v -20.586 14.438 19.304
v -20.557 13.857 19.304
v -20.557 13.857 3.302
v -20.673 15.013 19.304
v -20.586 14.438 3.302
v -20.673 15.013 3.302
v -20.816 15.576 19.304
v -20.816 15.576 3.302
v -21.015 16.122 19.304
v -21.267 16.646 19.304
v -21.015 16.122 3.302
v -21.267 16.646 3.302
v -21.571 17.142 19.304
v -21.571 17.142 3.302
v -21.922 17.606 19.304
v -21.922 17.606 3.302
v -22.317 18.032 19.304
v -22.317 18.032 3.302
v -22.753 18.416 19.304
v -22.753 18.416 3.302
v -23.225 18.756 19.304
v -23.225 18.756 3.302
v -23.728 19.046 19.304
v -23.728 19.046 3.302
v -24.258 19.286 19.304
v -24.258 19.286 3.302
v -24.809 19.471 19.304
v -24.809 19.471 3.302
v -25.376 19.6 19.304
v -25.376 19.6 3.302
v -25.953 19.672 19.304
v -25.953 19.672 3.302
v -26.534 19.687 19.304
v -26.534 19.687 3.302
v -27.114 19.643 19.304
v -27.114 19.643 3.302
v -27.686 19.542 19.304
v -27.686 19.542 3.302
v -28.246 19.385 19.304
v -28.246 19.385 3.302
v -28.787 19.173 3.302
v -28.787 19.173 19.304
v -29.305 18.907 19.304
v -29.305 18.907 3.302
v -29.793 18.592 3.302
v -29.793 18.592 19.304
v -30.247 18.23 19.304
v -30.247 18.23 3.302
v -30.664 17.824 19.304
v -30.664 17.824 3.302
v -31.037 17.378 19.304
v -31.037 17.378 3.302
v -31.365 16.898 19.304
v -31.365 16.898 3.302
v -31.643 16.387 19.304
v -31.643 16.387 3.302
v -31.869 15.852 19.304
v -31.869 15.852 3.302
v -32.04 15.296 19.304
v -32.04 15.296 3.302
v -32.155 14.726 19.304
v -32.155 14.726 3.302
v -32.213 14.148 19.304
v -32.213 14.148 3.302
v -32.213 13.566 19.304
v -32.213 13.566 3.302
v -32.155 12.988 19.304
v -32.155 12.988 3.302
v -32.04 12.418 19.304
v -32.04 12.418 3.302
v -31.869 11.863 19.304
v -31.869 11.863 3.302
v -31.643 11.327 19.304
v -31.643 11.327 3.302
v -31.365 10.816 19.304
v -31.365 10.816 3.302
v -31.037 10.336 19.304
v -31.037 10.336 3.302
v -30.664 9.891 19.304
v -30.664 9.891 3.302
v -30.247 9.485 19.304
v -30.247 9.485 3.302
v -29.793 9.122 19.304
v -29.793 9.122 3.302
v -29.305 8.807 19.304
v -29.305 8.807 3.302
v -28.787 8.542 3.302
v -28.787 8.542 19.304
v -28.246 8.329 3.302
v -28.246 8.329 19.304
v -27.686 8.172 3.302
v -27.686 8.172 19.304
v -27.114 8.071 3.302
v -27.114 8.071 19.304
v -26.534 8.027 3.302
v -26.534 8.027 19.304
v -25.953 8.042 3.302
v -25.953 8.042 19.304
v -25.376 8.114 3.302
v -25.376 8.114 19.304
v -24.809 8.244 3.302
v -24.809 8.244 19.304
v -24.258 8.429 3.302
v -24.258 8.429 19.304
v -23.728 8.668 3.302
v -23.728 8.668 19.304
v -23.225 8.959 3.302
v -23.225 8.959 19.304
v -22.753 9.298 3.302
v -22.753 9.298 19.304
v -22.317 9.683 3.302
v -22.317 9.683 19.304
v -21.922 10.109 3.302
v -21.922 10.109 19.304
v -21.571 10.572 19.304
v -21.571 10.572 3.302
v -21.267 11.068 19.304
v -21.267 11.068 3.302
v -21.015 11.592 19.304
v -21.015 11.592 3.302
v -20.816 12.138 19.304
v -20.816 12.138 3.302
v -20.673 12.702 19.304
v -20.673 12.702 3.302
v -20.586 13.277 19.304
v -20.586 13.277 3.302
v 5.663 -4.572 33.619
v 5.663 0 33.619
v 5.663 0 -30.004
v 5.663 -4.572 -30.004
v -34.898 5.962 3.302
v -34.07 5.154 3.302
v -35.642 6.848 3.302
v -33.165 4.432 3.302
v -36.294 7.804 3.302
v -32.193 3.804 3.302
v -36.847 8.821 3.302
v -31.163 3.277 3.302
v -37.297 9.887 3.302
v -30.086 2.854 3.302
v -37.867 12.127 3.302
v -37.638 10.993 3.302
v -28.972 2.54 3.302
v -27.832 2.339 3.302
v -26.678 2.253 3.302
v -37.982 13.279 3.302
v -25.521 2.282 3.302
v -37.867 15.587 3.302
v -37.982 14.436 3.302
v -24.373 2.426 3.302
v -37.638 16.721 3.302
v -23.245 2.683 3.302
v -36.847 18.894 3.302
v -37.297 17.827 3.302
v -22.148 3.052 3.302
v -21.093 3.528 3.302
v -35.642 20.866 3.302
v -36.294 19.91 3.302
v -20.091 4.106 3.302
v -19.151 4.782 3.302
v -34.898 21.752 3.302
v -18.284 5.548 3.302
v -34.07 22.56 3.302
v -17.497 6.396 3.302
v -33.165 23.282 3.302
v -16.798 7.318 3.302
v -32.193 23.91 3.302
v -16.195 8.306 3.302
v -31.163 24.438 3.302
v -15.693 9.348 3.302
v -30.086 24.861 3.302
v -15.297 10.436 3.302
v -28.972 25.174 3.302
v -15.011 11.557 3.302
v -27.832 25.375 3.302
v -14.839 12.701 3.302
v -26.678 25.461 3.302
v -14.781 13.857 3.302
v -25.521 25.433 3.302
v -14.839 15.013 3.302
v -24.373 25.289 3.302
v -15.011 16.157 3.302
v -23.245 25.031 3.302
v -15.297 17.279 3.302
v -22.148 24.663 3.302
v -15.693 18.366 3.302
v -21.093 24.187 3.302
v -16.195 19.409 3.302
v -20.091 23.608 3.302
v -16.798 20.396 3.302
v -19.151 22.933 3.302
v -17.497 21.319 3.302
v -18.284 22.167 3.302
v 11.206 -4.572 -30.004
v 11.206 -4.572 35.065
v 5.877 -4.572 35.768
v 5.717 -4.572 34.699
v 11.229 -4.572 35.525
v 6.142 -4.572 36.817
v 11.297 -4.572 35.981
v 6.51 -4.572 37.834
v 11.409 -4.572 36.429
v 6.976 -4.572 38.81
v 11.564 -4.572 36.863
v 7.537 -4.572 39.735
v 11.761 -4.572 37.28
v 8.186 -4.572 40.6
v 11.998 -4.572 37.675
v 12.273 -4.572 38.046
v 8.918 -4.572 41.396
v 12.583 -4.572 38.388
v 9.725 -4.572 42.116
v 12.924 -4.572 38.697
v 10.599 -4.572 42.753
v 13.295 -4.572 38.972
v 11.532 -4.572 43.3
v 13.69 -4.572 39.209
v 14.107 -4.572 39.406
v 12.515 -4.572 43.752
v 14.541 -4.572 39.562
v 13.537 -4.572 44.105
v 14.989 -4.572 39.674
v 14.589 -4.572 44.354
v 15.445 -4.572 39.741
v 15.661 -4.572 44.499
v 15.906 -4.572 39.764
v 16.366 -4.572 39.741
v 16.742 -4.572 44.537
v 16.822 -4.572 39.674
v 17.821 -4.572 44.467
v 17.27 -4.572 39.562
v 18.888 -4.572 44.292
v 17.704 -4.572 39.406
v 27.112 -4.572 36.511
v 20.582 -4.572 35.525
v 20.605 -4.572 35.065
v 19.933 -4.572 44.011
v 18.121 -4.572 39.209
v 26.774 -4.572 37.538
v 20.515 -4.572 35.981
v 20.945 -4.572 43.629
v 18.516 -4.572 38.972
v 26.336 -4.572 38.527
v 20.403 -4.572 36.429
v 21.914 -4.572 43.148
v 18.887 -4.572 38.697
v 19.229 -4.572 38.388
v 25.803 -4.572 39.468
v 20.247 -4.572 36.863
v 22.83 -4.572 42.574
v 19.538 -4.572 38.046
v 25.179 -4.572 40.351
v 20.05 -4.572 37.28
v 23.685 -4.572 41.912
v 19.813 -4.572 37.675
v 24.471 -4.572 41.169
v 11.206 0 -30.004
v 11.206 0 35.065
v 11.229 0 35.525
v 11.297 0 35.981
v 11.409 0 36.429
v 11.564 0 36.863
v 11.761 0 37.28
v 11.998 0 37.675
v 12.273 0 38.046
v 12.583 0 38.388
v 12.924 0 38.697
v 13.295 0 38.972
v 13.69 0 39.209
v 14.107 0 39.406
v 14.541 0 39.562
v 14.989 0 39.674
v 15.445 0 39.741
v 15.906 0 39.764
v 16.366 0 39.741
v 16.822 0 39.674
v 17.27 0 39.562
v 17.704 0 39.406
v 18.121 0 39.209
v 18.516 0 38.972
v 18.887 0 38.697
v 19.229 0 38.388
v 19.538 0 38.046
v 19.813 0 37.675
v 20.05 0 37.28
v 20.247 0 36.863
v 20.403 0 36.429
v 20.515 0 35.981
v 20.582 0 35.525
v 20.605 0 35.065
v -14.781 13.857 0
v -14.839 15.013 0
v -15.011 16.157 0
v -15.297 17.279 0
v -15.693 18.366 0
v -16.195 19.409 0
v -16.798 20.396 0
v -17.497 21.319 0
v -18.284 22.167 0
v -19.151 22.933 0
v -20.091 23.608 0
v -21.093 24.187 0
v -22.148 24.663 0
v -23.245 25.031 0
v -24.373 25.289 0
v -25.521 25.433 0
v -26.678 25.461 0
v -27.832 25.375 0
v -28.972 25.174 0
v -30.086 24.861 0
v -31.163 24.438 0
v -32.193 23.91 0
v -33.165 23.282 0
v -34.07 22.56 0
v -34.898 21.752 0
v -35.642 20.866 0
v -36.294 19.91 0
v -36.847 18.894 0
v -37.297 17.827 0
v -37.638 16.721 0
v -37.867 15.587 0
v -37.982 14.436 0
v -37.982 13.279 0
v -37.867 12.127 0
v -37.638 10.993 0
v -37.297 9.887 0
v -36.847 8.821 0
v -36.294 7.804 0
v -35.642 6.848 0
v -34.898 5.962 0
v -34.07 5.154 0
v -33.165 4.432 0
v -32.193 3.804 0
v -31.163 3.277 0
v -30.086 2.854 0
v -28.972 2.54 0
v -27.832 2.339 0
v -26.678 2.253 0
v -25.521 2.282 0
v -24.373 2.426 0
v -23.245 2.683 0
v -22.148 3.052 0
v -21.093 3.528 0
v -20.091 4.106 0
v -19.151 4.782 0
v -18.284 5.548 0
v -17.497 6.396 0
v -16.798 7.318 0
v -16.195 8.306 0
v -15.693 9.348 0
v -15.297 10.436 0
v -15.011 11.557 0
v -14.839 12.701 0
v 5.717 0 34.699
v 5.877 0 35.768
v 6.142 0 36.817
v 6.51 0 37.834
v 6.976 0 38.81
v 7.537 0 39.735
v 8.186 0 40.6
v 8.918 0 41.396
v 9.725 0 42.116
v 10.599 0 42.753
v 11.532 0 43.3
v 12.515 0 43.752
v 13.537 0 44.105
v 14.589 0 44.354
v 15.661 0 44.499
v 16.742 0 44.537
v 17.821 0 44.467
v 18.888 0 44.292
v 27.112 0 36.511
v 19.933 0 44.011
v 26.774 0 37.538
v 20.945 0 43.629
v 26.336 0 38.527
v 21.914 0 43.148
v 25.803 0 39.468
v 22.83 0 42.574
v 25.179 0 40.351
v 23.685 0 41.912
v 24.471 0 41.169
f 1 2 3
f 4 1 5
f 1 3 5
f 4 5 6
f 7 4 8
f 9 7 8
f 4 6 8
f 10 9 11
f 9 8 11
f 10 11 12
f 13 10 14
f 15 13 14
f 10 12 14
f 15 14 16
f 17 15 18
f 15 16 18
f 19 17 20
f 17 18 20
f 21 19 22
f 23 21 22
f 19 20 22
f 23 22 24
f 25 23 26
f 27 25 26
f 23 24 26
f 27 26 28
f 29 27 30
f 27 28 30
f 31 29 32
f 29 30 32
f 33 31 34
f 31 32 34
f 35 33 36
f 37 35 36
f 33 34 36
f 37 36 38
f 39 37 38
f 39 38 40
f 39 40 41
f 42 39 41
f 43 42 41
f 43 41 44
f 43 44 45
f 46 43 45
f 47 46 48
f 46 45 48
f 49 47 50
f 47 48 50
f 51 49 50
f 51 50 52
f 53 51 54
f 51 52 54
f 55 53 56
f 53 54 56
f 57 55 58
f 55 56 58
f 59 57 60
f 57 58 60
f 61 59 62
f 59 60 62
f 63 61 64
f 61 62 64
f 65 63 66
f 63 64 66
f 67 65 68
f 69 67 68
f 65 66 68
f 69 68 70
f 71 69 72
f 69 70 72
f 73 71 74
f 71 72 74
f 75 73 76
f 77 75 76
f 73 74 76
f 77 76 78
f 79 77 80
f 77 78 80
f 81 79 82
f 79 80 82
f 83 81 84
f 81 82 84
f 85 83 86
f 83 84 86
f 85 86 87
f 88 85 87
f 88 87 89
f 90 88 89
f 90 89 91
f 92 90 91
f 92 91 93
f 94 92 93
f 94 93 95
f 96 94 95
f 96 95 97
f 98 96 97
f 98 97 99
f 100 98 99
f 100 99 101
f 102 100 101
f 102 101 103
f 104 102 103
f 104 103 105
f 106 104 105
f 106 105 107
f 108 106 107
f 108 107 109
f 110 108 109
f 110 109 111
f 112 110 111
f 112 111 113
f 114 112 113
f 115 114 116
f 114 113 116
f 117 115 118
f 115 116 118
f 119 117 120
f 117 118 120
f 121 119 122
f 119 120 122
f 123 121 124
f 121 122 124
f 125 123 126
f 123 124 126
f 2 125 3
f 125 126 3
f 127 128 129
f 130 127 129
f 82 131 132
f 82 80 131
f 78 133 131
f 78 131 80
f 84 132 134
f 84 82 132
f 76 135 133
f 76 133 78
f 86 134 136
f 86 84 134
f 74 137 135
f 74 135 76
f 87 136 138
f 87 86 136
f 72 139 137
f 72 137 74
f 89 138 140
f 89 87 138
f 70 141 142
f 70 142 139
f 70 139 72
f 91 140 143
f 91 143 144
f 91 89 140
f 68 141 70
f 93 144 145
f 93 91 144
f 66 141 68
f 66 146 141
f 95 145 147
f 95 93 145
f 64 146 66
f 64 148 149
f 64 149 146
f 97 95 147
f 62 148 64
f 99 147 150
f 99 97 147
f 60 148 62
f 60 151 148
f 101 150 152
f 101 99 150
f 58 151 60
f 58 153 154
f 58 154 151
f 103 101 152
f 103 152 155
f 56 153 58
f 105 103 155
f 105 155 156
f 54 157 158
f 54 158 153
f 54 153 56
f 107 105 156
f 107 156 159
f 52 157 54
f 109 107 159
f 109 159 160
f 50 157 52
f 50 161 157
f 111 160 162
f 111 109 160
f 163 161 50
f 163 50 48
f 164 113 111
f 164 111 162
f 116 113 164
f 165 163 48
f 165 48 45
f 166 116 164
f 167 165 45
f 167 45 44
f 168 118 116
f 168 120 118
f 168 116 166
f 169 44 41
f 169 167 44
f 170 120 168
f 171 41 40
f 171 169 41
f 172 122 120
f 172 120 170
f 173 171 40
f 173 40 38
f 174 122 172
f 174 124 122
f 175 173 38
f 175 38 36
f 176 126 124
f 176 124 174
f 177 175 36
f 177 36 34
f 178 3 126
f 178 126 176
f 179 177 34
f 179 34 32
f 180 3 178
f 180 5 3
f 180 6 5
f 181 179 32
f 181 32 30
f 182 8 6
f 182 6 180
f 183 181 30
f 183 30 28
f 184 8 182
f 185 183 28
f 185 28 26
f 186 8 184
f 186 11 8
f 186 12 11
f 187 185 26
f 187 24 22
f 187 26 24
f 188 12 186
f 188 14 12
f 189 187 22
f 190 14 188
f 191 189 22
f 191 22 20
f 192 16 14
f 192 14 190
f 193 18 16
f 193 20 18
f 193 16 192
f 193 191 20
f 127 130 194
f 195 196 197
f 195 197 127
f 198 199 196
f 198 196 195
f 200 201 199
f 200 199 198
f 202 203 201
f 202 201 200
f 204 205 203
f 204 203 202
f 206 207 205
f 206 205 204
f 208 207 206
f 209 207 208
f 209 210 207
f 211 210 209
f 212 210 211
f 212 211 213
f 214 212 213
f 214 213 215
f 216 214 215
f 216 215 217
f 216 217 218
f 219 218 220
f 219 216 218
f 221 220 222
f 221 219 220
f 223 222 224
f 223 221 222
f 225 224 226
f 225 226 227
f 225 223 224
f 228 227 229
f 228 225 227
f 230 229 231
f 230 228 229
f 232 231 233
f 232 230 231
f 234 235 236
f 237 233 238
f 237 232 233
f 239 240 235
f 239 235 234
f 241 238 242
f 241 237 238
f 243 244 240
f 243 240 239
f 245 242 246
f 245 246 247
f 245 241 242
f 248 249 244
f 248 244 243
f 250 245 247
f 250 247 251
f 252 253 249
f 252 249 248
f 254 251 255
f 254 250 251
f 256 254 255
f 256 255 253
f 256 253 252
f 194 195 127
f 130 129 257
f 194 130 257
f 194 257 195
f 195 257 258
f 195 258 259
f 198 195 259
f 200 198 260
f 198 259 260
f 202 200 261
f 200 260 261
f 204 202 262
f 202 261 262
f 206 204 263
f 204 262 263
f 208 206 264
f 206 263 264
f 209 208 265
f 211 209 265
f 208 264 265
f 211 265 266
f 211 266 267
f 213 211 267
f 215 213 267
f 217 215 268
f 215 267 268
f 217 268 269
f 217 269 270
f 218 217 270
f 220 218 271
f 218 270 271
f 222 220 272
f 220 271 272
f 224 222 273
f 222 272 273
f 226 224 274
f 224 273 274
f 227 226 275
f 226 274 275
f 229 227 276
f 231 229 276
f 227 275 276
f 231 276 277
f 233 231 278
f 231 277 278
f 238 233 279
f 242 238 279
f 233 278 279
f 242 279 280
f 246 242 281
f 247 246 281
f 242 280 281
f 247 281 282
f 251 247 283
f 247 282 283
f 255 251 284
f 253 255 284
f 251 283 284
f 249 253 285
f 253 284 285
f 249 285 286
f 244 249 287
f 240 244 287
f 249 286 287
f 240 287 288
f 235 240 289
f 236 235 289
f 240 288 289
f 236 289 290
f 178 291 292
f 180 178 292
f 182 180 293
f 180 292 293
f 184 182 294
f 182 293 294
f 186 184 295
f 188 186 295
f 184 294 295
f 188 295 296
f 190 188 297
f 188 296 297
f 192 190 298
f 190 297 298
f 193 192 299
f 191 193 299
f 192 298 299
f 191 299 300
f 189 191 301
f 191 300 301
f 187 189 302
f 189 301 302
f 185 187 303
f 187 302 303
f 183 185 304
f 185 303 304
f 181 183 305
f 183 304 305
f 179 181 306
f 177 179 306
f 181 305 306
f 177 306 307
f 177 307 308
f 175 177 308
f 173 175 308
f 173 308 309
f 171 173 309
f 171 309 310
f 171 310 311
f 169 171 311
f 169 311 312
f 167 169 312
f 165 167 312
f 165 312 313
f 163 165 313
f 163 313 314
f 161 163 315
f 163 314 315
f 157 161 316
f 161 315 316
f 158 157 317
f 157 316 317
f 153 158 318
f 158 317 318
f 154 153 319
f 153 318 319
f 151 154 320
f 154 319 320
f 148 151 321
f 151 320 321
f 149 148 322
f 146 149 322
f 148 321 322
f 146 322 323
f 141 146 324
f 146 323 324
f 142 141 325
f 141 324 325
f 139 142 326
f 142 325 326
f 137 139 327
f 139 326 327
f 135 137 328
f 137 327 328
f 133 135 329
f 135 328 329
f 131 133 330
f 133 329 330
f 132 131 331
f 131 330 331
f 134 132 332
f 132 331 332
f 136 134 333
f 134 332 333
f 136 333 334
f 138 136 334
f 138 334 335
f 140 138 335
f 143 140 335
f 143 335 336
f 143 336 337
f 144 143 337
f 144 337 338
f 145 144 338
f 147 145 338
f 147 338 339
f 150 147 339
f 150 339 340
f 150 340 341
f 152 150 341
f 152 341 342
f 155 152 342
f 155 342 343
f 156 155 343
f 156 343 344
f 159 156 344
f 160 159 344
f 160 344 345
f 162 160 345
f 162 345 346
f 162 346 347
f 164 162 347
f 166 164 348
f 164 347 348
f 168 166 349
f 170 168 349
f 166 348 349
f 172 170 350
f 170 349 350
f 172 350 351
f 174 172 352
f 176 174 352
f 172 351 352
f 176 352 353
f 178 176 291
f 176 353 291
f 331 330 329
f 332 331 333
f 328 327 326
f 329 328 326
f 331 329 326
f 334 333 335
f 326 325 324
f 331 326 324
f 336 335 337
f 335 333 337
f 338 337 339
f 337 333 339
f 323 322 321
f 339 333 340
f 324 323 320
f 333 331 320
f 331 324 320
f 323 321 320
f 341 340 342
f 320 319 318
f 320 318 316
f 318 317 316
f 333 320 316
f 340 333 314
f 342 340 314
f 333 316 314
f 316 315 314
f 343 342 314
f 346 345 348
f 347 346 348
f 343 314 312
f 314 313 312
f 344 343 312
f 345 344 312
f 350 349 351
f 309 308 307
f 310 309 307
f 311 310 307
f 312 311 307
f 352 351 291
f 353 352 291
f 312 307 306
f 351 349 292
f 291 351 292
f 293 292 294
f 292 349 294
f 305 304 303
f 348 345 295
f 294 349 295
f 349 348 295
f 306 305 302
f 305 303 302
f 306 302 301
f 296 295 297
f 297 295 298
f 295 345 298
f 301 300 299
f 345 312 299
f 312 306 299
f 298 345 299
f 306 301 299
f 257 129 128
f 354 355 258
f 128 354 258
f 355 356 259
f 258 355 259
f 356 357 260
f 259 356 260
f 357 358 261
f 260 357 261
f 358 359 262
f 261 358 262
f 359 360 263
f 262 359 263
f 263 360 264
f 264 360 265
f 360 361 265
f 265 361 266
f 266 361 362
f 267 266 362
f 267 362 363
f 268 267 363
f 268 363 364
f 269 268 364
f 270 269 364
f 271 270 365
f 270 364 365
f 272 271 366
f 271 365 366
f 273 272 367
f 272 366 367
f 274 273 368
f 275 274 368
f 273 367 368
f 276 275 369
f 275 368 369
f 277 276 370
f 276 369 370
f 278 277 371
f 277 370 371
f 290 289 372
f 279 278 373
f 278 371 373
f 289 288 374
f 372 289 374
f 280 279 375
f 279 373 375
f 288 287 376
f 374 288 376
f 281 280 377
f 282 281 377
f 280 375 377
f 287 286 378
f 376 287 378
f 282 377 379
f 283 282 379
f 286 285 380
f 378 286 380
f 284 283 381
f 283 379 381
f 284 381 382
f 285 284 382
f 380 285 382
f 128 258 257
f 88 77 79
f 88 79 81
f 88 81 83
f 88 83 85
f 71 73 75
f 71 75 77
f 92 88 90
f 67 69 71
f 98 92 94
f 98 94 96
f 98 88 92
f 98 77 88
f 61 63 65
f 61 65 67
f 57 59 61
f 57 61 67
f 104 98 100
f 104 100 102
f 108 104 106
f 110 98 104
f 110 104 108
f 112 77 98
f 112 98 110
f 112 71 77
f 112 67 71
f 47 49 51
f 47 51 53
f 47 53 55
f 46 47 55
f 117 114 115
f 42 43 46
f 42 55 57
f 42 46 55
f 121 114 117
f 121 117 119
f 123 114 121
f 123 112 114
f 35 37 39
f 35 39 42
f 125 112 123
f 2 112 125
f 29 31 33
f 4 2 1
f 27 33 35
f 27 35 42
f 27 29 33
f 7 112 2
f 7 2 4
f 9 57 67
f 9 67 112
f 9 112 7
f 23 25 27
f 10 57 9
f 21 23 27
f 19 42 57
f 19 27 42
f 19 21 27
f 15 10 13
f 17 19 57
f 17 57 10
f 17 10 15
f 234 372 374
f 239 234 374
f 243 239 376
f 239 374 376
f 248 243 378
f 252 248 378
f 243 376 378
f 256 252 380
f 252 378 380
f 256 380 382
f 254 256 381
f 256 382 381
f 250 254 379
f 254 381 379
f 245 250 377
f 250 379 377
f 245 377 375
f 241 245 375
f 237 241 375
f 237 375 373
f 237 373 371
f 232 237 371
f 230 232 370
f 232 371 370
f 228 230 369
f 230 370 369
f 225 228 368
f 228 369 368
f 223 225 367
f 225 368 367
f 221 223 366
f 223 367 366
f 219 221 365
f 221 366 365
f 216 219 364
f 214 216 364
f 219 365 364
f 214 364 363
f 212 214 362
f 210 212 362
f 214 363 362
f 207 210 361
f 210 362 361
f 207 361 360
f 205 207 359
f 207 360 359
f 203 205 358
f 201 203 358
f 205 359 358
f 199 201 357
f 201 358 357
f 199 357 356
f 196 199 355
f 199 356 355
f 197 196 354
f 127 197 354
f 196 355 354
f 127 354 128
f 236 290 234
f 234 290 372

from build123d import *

# Parameters (mm, degrees)
F1_DEPTH = 4.572
F2_R     = 11.607807
F3_DEPTH = 3.302
F4_R     = 5.831545
F5_DEPTH = 16.002


with BuildPart() as f1:
    # F0 (on Front) → F1 (new body)
    with BuildSketch(Plane.XZ):
        with BuildLine():
            Line((5.663358, 16.267093), (5.663358, -10.242244))
            Line((5.663358, -10.242244), (5.663358, -30.003751))
            Line((5.663358, -30.003751), (11.206221, -30.003751))
            Line((11.206221, -30.003751), (11.206221, -10.483238))
            Line((11.206221, -10.483238), (11.206221, 16.0261))
            Line((11.206221, 16.0261), (11.206221, 35.064623))
            ThreePointArc((11.206221, 35.064623), (15.905604, 39.764006), (20.604987, 35.064623))
            Line((20.604987, 35.064623), (27.111825, 36.510587))
            ThreePointArc((27.111825, 36.510587), (15.123504, 44.439934), (5.663358, 33.618659))
            Line((5.663358, 33.618659), (5.663358, 16.267093))
        make_face()
    extrude(amount=F1_DEPTH)


with BuildPart() as f3:
    # F2 (on Top) → F3 (new body)
    with BuildSketch(Plane.XY):
        with Locations((-26.388841, 13.857153)):
            Circle(F2_R)
    extrude(amount=F3_DEPTH)

    # F4 (on face) → F5 (join)
    with BuildSketch(Plane.XY.offset(3.302)):
        with Locations((-26.388841, 13.857153)):
            Circle(F4_R)
    extrude(amount=F5_DEPTH)


solid = Compound([f1.part, f3.part])
